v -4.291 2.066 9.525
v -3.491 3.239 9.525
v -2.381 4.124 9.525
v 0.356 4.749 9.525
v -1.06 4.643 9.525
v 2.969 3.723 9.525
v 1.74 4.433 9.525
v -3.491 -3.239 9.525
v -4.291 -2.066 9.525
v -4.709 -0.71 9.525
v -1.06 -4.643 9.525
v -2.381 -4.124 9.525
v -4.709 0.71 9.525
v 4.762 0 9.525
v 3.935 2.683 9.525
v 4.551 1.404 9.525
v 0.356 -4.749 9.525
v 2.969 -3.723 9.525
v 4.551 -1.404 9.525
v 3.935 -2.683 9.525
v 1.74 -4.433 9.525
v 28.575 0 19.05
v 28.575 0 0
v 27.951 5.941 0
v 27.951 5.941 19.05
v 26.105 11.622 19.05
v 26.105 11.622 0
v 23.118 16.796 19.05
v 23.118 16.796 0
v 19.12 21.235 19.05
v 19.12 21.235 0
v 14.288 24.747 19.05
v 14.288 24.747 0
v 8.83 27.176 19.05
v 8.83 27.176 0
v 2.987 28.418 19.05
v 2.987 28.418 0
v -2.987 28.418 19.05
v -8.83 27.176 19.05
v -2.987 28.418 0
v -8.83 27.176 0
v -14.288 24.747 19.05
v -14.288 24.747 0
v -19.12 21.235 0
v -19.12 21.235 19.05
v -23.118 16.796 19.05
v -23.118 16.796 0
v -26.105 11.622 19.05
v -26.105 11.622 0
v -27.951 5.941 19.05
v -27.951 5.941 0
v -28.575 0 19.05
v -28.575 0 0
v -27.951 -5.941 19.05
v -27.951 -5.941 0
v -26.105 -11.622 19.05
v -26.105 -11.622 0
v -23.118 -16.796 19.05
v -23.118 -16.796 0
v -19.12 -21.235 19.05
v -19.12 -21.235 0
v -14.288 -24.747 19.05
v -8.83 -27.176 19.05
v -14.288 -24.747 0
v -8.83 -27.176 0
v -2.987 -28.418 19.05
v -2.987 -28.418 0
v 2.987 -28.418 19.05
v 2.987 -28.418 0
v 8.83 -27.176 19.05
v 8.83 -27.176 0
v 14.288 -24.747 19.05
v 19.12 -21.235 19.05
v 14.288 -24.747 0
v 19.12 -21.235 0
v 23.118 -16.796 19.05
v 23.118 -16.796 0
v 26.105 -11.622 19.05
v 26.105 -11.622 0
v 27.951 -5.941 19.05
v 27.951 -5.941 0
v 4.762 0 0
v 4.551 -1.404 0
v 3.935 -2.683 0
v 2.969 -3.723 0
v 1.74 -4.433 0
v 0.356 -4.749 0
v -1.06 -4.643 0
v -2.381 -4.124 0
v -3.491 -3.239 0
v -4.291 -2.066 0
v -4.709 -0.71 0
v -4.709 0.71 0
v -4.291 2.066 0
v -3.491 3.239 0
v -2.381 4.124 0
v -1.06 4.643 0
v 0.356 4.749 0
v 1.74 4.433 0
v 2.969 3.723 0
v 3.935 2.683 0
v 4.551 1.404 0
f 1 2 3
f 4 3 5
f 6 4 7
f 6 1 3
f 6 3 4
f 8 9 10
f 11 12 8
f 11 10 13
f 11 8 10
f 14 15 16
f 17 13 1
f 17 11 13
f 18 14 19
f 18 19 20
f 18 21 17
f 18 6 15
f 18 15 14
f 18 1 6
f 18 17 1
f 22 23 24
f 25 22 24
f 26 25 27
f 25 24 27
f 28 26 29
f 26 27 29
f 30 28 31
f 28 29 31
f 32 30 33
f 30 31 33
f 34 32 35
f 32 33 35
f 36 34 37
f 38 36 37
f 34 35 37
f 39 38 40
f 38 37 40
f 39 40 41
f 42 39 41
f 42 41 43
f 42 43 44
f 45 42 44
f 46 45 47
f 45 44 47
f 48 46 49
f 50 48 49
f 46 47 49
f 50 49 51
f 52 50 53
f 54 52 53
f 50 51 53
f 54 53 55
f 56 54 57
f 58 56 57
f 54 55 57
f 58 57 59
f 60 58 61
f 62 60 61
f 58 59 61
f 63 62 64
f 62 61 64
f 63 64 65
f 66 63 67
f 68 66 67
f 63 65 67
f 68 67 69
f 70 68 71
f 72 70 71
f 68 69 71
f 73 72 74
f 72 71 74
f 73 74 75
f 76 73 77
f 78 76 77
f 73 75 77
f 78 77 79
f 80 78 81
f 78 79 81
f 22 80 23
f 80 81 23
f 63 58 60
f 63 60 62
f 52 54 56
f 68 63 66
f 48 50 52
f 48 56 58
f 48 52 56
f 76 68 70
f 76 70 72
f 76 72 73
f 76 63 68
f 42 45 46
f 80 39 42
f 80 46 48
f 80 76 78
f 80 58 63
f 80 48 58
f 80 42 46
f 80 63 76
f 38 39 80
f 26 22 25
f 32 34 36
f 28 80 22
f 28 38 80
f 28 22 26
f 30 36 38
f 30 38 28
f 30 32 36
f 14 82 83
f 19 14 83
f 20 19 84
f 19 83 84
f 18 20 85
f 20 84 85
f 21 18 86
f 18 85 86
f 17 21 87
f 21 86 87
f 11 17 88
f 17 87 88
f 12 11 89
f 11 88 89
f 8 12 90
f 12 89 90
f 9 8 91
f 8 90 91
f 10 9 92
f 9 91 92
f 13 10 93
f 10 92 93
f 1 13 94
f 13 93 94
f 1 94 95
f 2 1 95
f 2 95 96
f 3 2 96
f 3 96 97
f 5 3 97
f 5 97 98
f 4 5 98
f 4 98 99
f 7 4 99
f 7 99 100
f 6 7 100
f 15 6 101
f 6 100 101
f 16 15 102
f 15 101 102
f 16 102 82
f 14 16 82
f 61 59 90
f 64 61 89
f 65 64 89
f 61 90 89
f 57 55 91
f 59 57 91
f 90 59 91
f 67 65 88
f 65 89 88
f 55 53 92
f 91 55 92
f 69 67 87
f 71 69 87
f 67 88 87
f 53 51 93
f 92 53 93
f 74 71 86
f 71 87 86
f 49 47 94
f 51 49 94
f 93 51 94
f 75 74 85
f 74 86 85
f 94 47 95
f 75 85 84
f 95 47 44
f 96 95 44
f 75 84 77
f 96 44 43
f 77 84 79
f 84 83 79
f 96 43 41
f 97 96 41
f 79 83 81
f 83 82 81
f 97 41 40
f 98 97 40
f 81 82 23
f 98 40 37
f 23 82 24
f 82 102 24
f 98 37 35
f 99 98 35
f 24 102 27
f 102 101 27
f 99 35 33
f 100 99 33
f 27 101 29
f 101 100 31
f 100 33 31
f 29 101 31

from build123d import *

# Parameters (mm, degrees)
F0_R     = 28.575
F1_DEPTH = 19.05
F2_R     = 4.7625
F3_DEPTH = 9.525
F4_R     = 4.7625
F5_DEPTH = 9.525


with BuildPart() as f1:
    # F0 (on Top) → F1 (new body)
    with BuildSketch(Plane.XY):
        Circle(F0_R)
    extrude(amount=F1_DEPTH)

    # F2 (on Top) → F3 (join)
    with BuildSketch(Plane.XY):
        Circle(F2_R)
    extrude(amount=F3_DEPTH)

    # F4 (on face) → F5 (cut)
    with BuildSketch(Plane(origin=(0, 0, 0), x_dir=(1, 0, 0), z_dir=(0, 0, -1))):
        Circle(F4_R)
    extrude(amount=-F5_DEPTH, mode=Mode.SUBTRACT)


solid = f1.part
